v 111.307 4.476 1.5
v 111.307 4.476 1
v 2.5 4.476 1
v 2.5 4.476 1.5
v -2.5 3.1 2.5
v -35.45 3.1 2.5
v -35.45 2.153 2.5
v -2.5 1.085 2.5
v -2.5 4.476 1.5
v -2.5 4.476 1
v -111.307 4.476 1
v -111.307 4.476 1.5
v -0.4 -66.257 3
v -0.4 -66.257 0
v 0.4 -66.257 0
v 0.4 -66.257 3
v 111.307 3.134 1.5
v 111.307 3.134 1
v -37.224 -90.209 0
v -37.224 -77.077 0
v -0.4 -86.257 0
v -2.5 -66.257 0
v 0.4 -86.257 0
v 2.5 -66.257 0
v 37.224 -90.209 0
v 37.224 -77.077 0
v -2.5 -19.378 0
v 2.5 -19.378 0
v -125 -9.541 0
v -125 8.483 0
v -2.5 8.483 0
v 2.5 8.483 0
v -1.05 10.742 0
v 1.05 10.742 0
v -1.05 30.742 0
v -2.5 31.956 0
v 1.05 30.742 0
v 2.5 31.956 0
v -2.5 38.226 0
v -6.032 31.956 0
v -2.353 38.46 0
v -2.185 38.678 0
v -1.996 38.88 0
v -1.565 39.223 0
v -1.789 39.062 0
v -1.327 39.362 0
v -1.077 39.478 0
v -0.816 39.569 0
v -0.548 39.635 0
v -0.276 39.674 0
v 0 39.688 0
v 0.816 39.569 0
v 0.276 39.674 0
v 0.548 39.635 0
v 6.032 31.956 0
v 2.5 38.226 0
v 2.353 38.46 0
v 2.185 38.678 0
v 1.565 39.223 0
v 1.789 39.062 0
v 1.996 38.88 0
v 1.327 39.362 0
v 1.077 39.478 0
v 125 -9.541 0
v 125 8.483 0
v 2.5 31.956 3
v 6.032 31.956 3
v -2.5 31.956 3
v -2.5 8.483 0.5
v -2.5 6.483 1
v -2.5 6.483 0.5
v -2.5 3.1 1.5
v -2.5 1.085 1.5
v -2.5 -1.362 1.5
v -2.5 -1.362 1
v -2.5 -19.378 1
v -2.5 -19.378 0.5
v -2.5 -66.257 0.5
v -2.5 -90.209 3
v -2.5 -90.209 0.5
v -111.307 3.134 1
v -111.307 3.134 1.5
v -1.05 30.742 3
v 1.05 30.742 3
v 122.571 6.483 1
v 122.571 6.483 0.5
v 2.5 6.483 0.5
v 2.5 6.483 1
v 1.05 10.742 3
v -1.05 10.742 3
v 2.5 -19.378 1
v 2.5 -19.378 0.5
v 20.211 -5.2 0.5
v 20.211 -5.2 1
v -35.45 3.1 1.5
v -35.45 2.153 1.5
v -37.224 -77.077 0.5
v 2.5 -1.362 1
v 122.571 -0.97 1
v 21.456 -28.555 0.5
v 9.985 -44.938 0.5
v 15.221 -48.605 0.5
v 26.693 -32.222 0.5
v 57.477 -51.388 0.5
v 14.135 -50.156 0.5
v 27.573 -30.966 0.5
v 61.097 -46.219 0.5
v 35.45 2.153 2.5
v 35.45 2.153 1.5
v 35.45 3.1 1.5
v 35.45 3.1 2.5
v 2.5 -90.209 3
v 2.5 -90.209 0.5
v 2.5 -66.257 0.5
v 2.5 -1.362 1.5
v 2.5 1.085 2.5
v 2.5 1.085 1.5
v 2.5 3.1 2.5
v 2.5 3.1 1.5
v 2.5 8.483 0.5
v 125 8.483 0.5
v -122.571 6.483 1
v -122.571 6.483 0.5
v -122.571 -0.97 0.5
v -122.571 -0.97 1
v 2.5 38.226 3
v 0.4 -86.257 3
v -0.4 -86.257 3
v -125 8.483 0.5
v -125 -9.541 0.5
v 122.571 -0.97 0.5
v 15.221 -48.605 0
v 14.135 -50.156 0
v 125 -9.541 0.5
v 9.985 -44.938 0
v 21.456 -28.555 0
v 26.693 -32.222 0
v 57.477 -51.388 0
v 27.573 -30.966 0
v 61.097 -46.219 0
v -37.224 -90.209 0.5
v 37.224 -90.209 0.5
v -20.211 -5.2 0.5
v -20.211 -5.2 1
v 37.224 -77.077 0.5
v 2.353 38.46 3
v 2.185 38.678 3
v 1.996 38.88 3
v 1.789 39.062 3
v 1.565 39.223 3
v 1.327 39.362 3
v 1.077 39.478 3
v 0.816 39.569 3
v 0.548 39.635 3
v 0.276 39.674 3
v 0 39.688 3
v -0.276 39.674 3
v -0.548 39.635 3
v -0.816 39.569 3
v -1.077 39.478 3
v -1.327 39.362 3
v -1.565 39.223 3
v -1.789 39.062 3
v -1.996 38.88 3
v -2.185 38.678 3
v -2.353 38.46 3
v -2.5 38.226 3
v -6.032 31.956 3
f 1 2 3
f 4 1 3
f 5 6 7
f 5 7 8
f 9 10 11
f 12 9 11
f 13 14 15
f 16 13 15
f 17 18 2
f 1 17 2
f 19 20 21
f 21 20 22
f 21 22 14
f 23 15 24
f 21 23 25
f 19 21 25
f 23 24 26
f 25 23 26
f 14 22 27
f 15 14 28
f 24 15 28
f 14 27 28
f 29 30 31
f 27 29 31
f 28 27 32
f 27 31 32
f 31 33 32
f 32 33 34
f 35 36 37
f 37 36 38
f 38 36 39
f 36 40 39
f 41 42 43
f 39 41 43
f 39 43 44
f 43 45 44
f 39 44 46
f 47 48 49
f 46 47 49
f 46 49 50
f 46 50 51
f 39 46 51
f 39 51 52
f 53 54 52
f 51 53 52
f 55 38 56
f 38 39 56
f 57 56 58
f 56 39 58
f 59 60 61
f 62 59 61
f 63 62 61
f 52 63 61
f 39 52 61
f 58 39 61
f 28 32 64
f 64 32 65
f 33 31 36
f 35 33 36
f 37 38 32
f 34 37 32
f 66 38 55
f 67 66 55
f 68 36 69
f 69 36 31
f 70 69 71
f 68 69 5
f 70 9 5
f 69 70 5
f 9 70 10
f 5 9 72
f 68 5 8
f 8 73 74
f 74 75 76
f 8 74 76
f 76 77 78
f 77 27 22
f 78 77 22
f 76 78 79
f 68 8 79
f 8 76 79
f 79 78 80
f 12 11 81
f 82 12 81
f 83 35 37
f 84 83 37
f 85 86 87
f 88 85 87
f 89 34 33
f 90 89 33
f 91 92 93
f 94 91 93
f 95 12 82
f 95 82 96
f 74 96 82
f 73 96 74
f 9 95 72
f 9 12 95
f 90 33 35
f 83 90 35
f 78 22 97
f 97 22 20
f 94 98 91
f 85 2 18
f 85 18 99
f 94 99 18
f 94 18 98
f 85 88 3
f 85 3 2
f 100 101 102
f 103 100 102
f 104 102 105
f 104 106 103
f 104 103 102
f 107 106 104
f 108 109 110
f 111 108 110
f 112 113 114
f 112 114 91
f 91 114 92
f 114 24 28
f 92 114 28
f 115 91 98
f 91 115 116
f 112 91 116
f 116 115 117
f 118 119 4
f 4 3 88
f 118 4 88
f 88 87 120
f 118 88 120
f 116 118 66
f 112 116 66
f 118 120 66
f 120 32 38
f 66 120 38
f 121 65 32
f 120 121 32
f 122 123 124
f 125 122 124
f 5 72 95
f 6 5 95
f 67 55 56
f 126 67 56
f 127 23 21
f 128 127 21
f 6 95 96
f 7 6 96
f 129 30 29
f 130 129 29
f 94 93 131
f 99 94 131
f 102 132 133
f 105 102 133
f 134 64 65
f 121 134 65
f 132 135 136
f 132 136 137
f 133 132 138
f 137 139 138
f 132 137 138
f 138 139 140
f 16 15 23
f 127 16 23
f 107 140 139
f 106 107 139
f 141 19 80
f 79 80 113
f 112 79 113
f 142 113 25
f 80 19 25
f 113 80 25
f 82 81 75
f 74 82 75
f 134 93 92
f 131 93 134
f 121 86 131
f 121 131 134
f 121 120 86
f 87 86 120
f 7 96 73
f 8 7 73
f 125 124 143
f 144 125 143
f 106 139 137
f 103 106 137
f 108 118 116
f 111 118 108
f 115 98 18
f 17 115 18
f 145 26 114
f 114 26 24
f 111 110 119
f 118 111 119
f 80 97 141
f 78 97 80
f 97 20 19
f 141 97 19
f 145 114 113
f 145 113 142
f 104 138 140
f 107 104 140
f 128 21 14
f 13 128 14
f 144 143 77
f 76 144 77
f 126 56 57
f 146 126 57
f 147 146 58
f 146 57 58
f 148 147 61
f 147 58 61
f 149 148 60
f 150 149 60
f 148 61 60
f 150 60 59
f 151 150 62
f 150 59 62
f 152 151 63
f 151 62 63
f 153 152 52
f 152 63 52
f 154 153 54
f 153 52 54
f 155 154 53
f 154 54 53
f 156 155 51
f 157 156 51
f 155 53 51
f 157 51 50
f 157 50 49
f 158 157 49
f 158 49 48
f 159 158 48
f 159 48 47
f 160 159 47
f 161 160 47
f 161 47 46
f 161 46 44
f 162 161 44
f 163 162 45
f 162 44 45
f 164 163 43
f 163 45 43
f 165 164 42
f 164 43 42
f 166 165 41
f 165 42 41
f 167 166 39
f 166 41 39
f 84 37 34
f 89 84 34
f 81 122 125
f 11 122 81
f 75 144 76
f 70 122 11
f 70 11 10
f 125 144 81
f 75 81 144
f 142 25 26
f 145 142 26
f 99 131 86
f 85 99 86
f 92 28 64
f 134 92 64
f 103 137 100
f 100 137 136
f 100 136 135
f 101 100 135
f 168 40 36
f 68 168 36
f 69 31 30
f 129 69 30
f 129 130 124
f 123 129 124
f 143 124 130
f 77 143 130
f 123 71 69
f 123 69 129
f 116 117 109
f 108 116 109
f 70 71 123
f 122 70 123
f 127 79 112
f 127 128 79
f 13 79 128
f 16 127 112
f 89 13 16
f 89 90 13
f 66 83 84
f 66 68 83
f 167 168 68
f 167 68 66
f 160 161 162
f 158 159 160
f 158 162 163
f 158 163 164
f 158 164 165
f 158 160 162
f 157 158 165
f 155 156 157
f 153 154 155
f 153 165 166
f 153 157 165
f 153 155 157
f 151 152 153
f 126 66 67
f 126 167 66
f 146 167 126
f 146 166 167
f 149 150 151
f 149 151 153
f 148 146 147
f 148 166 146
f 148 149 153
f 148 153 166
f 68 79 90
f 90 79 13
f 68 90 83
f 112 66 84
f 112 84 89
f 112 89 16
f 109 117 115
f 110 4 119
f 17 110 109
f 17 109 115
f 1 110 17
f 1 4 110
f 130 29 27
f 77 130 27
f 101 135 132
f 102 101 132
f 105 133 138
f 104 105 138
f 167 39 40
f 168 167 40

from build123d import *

# Parameters (mm, degrees)
F1_DEPTH = 0.5
F2_DEPTH = 3
F4_DEPTH = 0.5
F5_DEPTH = 0.5
F7_DEPTH = 0.5
F9_DEPTH = 1


# Not quite as in the source:
# - a feature names something its author has since deleted; it is built from what else it names


with BuildPart() as f1:
    # F0 (on Top) → F1 (new body)
    with BuildSketch(Plane.XY):
        Polygon((-2.5, -19.3782690912), (-2.5, 8.4829014608), (-125, 8.4829014608), (-125, 0), (-125, -9.5409080386), align=None)
        Polygon((-2.5, -90.2088385105), (-2.5, -66.2574071428), (-37.2240561792, -77.0772191324), (-37.2240561792, -90.2088385105), align=None)
        Polygon((37.2240561792, -77.0772191324), (2.5, -66.2574071428), (2.5, -90.2088385105), (37.2240561792, -90.2088385105), align=None)
        Polygon((125, 8.4829014608), (2.5, 8.4829014608), (2.5, -19.3782690912), (125, -9.5409080386), (125, 0), align=None)
        Polygon((2.5, 38.2264746347), (0, 38.2264746347), (-2.5, 38.2264746347), (-2.5, 31.9558866322), (-2.5, 8.4829014608), (-2.5, -19.3782690912), (-2.5, -66.2574071428), (-2.5, -90.2088385105), (0, -90.2088385105), (2.5, -90.2088385105), (2.5, -66.2574071428), (2.5, -19.3782690912), (2.5, 8.4829014608), (2.5, 31.9558866322), align=None)
        Polygon((-0.4, -66.2574071428), (0, -66.2574071428), (0.4, -66.2574071428), (0.4, -86.2574071428), (0, -86.2574071428), (-0.4, -86.2574071428), align=None, mode=Mode.SUBTRACT)
        Polygon((-1.05, 30.741930455), (0, 30.741930455), (1.05, 30.741930455), (1.05, 10.741930455), (0, 10.741930455), (-1.05, 10.741930455), align=None, mode=Mode.SUBTRACT)
    extrude(amount=F1_DEPTH)

    # F0 (on Top) → F2 (join)
    with BuildSketch(Plane.XY):
        Polygon((2.5, 38.2264746347), (0, 38.2264746347), (-2.5, 38.2264746347), (-2.5, 31.9558866322), (-2.5, 8.4829014608), (-2.5, -19.3782690912), (-2.5, -66.2574071428), (-2.5, -90.2088385105), (0, -90.2088385105), (2.5, -90.2088385105), (2.5, -66.2574071428), (2.5, -19.3782690912), (2.5, 8.4829014608), (2.5, 31.9558866322), align=None)
        Polygon((-0.4, -66.2574071428), (0, -66.2574071428), (0.4, -66.2574071428), (0.4, -86.2574071428), (0, -86.2574071428), (-0.4, -86.2574071428), align=None, mode=Mode.SUBTRACT)
        Polygon((-1.05, 30.741930455), (0, 30.741930455), (1.05, 30.741930455), (1.05, 10.741930455), (0, 10.741930455), (-1.05, 10.741930455), align=None, mode=Mode.SUBTRACT)
        Polygon((-2.5, 31.9558866322), (-2.5, 38.2264746347), (-6.0318950564, 31.9558866322), align=None)
        Polygon((6.0318950564, 31.9558866322), (2.5, 38.2264746347), (2.5, 31.9558866322), align=None)
        with BuildLine():
            Line((-2.5, 38.2264746347), (0, 38.2264746347))
            Line((0, 38.2264746347), (2.5, 38.2264746347))
            ThreePointArc((2.5, 38.2264746347), (0, 39.6876408194), (-2.5, 38.2264746347))
        make_face()
    extrude(amount=F2_DEPTH)

    # F3 (on face) → F4 (join)
    with BuildSketch(Plane.XY.offset(0.5)):
        Polygon((-2.5, -5.9316507274), (-2.5, 6.4829014608), (-122.5709915161, 6.4829014608), (-122.5709915161, -0.9700714727), (-20.2113245095, -5.1997825289), align=None)
        Polygon((122.5709915161, 6.4829014608), (0, 6.4829014608), (0, -6.034955847), (20.2113245095, -5.1997825289), (122.5709915161, -0.9700714727), align=None)
        Polygon((-2.5, -19.3782690912), (-2.5, -5.9316507274), (-20.2113245095, -5.1997825289), align=None)
        Polygon((20.2113245095, -5.1997825289), (0, -6.034955847), (0, -19.3782690912), (2.5, -19.3782690912), align=None)
    extrude(amount=F4_DEPTH)

    # F6 (on face) → F7 (join)
    with BuildSketch(Plane.XY.offset(1)):
        Polygon((111.3073602319, 4.4760769233), (0, 4.4760769233), (-111.3073602319, 4.4760769233), (-111.3073602319, 3.1342721807), (0, -1.4651758829), (111.3073602319, 3.1342721807), align=None)
    extrude(amount=F7_DEPTH)

    # F8 (on face) → F9 (join)
    with BuildSketch(Plane.XY.offset(1.5)):
        Polygon((-2.5, 1.0846625931), (-2.5, 3.1001814641), (-35.4501530528, 3.1001814641), (-35.4501530528, 2.1533293184), align=None)
        Polygon((35.4501530528, 3.1001814641), (0, 3.1001814641), (-2.5, 3.1001814641), (-2.5, 1.0846625931), (0, 1.0035805171), (35.4501530528, 2.1533293184), align=None)
    extrude(amount=F9_DEPTH)


with BuildPart() as f5:
    # F0 (on Top) → F5 (new body)
    with BuildSketch(Plane.XY):
        Polygon((15.2214128825, -48.6049928758), (14.1352575937, -50.1561833865), (57.4773901376, -51.3879905945), (61.0969997942, -46.2186522782), (27.5726027584, -30.9656656737), (26.6929416095, -32.22195199), (21.4564287133, -28.5553061862), (9.9848999862, -44.9383470719), align=None)
    extrude(amount=F5_DEPTH)


solid = Compound([f1.part, f5.part])
